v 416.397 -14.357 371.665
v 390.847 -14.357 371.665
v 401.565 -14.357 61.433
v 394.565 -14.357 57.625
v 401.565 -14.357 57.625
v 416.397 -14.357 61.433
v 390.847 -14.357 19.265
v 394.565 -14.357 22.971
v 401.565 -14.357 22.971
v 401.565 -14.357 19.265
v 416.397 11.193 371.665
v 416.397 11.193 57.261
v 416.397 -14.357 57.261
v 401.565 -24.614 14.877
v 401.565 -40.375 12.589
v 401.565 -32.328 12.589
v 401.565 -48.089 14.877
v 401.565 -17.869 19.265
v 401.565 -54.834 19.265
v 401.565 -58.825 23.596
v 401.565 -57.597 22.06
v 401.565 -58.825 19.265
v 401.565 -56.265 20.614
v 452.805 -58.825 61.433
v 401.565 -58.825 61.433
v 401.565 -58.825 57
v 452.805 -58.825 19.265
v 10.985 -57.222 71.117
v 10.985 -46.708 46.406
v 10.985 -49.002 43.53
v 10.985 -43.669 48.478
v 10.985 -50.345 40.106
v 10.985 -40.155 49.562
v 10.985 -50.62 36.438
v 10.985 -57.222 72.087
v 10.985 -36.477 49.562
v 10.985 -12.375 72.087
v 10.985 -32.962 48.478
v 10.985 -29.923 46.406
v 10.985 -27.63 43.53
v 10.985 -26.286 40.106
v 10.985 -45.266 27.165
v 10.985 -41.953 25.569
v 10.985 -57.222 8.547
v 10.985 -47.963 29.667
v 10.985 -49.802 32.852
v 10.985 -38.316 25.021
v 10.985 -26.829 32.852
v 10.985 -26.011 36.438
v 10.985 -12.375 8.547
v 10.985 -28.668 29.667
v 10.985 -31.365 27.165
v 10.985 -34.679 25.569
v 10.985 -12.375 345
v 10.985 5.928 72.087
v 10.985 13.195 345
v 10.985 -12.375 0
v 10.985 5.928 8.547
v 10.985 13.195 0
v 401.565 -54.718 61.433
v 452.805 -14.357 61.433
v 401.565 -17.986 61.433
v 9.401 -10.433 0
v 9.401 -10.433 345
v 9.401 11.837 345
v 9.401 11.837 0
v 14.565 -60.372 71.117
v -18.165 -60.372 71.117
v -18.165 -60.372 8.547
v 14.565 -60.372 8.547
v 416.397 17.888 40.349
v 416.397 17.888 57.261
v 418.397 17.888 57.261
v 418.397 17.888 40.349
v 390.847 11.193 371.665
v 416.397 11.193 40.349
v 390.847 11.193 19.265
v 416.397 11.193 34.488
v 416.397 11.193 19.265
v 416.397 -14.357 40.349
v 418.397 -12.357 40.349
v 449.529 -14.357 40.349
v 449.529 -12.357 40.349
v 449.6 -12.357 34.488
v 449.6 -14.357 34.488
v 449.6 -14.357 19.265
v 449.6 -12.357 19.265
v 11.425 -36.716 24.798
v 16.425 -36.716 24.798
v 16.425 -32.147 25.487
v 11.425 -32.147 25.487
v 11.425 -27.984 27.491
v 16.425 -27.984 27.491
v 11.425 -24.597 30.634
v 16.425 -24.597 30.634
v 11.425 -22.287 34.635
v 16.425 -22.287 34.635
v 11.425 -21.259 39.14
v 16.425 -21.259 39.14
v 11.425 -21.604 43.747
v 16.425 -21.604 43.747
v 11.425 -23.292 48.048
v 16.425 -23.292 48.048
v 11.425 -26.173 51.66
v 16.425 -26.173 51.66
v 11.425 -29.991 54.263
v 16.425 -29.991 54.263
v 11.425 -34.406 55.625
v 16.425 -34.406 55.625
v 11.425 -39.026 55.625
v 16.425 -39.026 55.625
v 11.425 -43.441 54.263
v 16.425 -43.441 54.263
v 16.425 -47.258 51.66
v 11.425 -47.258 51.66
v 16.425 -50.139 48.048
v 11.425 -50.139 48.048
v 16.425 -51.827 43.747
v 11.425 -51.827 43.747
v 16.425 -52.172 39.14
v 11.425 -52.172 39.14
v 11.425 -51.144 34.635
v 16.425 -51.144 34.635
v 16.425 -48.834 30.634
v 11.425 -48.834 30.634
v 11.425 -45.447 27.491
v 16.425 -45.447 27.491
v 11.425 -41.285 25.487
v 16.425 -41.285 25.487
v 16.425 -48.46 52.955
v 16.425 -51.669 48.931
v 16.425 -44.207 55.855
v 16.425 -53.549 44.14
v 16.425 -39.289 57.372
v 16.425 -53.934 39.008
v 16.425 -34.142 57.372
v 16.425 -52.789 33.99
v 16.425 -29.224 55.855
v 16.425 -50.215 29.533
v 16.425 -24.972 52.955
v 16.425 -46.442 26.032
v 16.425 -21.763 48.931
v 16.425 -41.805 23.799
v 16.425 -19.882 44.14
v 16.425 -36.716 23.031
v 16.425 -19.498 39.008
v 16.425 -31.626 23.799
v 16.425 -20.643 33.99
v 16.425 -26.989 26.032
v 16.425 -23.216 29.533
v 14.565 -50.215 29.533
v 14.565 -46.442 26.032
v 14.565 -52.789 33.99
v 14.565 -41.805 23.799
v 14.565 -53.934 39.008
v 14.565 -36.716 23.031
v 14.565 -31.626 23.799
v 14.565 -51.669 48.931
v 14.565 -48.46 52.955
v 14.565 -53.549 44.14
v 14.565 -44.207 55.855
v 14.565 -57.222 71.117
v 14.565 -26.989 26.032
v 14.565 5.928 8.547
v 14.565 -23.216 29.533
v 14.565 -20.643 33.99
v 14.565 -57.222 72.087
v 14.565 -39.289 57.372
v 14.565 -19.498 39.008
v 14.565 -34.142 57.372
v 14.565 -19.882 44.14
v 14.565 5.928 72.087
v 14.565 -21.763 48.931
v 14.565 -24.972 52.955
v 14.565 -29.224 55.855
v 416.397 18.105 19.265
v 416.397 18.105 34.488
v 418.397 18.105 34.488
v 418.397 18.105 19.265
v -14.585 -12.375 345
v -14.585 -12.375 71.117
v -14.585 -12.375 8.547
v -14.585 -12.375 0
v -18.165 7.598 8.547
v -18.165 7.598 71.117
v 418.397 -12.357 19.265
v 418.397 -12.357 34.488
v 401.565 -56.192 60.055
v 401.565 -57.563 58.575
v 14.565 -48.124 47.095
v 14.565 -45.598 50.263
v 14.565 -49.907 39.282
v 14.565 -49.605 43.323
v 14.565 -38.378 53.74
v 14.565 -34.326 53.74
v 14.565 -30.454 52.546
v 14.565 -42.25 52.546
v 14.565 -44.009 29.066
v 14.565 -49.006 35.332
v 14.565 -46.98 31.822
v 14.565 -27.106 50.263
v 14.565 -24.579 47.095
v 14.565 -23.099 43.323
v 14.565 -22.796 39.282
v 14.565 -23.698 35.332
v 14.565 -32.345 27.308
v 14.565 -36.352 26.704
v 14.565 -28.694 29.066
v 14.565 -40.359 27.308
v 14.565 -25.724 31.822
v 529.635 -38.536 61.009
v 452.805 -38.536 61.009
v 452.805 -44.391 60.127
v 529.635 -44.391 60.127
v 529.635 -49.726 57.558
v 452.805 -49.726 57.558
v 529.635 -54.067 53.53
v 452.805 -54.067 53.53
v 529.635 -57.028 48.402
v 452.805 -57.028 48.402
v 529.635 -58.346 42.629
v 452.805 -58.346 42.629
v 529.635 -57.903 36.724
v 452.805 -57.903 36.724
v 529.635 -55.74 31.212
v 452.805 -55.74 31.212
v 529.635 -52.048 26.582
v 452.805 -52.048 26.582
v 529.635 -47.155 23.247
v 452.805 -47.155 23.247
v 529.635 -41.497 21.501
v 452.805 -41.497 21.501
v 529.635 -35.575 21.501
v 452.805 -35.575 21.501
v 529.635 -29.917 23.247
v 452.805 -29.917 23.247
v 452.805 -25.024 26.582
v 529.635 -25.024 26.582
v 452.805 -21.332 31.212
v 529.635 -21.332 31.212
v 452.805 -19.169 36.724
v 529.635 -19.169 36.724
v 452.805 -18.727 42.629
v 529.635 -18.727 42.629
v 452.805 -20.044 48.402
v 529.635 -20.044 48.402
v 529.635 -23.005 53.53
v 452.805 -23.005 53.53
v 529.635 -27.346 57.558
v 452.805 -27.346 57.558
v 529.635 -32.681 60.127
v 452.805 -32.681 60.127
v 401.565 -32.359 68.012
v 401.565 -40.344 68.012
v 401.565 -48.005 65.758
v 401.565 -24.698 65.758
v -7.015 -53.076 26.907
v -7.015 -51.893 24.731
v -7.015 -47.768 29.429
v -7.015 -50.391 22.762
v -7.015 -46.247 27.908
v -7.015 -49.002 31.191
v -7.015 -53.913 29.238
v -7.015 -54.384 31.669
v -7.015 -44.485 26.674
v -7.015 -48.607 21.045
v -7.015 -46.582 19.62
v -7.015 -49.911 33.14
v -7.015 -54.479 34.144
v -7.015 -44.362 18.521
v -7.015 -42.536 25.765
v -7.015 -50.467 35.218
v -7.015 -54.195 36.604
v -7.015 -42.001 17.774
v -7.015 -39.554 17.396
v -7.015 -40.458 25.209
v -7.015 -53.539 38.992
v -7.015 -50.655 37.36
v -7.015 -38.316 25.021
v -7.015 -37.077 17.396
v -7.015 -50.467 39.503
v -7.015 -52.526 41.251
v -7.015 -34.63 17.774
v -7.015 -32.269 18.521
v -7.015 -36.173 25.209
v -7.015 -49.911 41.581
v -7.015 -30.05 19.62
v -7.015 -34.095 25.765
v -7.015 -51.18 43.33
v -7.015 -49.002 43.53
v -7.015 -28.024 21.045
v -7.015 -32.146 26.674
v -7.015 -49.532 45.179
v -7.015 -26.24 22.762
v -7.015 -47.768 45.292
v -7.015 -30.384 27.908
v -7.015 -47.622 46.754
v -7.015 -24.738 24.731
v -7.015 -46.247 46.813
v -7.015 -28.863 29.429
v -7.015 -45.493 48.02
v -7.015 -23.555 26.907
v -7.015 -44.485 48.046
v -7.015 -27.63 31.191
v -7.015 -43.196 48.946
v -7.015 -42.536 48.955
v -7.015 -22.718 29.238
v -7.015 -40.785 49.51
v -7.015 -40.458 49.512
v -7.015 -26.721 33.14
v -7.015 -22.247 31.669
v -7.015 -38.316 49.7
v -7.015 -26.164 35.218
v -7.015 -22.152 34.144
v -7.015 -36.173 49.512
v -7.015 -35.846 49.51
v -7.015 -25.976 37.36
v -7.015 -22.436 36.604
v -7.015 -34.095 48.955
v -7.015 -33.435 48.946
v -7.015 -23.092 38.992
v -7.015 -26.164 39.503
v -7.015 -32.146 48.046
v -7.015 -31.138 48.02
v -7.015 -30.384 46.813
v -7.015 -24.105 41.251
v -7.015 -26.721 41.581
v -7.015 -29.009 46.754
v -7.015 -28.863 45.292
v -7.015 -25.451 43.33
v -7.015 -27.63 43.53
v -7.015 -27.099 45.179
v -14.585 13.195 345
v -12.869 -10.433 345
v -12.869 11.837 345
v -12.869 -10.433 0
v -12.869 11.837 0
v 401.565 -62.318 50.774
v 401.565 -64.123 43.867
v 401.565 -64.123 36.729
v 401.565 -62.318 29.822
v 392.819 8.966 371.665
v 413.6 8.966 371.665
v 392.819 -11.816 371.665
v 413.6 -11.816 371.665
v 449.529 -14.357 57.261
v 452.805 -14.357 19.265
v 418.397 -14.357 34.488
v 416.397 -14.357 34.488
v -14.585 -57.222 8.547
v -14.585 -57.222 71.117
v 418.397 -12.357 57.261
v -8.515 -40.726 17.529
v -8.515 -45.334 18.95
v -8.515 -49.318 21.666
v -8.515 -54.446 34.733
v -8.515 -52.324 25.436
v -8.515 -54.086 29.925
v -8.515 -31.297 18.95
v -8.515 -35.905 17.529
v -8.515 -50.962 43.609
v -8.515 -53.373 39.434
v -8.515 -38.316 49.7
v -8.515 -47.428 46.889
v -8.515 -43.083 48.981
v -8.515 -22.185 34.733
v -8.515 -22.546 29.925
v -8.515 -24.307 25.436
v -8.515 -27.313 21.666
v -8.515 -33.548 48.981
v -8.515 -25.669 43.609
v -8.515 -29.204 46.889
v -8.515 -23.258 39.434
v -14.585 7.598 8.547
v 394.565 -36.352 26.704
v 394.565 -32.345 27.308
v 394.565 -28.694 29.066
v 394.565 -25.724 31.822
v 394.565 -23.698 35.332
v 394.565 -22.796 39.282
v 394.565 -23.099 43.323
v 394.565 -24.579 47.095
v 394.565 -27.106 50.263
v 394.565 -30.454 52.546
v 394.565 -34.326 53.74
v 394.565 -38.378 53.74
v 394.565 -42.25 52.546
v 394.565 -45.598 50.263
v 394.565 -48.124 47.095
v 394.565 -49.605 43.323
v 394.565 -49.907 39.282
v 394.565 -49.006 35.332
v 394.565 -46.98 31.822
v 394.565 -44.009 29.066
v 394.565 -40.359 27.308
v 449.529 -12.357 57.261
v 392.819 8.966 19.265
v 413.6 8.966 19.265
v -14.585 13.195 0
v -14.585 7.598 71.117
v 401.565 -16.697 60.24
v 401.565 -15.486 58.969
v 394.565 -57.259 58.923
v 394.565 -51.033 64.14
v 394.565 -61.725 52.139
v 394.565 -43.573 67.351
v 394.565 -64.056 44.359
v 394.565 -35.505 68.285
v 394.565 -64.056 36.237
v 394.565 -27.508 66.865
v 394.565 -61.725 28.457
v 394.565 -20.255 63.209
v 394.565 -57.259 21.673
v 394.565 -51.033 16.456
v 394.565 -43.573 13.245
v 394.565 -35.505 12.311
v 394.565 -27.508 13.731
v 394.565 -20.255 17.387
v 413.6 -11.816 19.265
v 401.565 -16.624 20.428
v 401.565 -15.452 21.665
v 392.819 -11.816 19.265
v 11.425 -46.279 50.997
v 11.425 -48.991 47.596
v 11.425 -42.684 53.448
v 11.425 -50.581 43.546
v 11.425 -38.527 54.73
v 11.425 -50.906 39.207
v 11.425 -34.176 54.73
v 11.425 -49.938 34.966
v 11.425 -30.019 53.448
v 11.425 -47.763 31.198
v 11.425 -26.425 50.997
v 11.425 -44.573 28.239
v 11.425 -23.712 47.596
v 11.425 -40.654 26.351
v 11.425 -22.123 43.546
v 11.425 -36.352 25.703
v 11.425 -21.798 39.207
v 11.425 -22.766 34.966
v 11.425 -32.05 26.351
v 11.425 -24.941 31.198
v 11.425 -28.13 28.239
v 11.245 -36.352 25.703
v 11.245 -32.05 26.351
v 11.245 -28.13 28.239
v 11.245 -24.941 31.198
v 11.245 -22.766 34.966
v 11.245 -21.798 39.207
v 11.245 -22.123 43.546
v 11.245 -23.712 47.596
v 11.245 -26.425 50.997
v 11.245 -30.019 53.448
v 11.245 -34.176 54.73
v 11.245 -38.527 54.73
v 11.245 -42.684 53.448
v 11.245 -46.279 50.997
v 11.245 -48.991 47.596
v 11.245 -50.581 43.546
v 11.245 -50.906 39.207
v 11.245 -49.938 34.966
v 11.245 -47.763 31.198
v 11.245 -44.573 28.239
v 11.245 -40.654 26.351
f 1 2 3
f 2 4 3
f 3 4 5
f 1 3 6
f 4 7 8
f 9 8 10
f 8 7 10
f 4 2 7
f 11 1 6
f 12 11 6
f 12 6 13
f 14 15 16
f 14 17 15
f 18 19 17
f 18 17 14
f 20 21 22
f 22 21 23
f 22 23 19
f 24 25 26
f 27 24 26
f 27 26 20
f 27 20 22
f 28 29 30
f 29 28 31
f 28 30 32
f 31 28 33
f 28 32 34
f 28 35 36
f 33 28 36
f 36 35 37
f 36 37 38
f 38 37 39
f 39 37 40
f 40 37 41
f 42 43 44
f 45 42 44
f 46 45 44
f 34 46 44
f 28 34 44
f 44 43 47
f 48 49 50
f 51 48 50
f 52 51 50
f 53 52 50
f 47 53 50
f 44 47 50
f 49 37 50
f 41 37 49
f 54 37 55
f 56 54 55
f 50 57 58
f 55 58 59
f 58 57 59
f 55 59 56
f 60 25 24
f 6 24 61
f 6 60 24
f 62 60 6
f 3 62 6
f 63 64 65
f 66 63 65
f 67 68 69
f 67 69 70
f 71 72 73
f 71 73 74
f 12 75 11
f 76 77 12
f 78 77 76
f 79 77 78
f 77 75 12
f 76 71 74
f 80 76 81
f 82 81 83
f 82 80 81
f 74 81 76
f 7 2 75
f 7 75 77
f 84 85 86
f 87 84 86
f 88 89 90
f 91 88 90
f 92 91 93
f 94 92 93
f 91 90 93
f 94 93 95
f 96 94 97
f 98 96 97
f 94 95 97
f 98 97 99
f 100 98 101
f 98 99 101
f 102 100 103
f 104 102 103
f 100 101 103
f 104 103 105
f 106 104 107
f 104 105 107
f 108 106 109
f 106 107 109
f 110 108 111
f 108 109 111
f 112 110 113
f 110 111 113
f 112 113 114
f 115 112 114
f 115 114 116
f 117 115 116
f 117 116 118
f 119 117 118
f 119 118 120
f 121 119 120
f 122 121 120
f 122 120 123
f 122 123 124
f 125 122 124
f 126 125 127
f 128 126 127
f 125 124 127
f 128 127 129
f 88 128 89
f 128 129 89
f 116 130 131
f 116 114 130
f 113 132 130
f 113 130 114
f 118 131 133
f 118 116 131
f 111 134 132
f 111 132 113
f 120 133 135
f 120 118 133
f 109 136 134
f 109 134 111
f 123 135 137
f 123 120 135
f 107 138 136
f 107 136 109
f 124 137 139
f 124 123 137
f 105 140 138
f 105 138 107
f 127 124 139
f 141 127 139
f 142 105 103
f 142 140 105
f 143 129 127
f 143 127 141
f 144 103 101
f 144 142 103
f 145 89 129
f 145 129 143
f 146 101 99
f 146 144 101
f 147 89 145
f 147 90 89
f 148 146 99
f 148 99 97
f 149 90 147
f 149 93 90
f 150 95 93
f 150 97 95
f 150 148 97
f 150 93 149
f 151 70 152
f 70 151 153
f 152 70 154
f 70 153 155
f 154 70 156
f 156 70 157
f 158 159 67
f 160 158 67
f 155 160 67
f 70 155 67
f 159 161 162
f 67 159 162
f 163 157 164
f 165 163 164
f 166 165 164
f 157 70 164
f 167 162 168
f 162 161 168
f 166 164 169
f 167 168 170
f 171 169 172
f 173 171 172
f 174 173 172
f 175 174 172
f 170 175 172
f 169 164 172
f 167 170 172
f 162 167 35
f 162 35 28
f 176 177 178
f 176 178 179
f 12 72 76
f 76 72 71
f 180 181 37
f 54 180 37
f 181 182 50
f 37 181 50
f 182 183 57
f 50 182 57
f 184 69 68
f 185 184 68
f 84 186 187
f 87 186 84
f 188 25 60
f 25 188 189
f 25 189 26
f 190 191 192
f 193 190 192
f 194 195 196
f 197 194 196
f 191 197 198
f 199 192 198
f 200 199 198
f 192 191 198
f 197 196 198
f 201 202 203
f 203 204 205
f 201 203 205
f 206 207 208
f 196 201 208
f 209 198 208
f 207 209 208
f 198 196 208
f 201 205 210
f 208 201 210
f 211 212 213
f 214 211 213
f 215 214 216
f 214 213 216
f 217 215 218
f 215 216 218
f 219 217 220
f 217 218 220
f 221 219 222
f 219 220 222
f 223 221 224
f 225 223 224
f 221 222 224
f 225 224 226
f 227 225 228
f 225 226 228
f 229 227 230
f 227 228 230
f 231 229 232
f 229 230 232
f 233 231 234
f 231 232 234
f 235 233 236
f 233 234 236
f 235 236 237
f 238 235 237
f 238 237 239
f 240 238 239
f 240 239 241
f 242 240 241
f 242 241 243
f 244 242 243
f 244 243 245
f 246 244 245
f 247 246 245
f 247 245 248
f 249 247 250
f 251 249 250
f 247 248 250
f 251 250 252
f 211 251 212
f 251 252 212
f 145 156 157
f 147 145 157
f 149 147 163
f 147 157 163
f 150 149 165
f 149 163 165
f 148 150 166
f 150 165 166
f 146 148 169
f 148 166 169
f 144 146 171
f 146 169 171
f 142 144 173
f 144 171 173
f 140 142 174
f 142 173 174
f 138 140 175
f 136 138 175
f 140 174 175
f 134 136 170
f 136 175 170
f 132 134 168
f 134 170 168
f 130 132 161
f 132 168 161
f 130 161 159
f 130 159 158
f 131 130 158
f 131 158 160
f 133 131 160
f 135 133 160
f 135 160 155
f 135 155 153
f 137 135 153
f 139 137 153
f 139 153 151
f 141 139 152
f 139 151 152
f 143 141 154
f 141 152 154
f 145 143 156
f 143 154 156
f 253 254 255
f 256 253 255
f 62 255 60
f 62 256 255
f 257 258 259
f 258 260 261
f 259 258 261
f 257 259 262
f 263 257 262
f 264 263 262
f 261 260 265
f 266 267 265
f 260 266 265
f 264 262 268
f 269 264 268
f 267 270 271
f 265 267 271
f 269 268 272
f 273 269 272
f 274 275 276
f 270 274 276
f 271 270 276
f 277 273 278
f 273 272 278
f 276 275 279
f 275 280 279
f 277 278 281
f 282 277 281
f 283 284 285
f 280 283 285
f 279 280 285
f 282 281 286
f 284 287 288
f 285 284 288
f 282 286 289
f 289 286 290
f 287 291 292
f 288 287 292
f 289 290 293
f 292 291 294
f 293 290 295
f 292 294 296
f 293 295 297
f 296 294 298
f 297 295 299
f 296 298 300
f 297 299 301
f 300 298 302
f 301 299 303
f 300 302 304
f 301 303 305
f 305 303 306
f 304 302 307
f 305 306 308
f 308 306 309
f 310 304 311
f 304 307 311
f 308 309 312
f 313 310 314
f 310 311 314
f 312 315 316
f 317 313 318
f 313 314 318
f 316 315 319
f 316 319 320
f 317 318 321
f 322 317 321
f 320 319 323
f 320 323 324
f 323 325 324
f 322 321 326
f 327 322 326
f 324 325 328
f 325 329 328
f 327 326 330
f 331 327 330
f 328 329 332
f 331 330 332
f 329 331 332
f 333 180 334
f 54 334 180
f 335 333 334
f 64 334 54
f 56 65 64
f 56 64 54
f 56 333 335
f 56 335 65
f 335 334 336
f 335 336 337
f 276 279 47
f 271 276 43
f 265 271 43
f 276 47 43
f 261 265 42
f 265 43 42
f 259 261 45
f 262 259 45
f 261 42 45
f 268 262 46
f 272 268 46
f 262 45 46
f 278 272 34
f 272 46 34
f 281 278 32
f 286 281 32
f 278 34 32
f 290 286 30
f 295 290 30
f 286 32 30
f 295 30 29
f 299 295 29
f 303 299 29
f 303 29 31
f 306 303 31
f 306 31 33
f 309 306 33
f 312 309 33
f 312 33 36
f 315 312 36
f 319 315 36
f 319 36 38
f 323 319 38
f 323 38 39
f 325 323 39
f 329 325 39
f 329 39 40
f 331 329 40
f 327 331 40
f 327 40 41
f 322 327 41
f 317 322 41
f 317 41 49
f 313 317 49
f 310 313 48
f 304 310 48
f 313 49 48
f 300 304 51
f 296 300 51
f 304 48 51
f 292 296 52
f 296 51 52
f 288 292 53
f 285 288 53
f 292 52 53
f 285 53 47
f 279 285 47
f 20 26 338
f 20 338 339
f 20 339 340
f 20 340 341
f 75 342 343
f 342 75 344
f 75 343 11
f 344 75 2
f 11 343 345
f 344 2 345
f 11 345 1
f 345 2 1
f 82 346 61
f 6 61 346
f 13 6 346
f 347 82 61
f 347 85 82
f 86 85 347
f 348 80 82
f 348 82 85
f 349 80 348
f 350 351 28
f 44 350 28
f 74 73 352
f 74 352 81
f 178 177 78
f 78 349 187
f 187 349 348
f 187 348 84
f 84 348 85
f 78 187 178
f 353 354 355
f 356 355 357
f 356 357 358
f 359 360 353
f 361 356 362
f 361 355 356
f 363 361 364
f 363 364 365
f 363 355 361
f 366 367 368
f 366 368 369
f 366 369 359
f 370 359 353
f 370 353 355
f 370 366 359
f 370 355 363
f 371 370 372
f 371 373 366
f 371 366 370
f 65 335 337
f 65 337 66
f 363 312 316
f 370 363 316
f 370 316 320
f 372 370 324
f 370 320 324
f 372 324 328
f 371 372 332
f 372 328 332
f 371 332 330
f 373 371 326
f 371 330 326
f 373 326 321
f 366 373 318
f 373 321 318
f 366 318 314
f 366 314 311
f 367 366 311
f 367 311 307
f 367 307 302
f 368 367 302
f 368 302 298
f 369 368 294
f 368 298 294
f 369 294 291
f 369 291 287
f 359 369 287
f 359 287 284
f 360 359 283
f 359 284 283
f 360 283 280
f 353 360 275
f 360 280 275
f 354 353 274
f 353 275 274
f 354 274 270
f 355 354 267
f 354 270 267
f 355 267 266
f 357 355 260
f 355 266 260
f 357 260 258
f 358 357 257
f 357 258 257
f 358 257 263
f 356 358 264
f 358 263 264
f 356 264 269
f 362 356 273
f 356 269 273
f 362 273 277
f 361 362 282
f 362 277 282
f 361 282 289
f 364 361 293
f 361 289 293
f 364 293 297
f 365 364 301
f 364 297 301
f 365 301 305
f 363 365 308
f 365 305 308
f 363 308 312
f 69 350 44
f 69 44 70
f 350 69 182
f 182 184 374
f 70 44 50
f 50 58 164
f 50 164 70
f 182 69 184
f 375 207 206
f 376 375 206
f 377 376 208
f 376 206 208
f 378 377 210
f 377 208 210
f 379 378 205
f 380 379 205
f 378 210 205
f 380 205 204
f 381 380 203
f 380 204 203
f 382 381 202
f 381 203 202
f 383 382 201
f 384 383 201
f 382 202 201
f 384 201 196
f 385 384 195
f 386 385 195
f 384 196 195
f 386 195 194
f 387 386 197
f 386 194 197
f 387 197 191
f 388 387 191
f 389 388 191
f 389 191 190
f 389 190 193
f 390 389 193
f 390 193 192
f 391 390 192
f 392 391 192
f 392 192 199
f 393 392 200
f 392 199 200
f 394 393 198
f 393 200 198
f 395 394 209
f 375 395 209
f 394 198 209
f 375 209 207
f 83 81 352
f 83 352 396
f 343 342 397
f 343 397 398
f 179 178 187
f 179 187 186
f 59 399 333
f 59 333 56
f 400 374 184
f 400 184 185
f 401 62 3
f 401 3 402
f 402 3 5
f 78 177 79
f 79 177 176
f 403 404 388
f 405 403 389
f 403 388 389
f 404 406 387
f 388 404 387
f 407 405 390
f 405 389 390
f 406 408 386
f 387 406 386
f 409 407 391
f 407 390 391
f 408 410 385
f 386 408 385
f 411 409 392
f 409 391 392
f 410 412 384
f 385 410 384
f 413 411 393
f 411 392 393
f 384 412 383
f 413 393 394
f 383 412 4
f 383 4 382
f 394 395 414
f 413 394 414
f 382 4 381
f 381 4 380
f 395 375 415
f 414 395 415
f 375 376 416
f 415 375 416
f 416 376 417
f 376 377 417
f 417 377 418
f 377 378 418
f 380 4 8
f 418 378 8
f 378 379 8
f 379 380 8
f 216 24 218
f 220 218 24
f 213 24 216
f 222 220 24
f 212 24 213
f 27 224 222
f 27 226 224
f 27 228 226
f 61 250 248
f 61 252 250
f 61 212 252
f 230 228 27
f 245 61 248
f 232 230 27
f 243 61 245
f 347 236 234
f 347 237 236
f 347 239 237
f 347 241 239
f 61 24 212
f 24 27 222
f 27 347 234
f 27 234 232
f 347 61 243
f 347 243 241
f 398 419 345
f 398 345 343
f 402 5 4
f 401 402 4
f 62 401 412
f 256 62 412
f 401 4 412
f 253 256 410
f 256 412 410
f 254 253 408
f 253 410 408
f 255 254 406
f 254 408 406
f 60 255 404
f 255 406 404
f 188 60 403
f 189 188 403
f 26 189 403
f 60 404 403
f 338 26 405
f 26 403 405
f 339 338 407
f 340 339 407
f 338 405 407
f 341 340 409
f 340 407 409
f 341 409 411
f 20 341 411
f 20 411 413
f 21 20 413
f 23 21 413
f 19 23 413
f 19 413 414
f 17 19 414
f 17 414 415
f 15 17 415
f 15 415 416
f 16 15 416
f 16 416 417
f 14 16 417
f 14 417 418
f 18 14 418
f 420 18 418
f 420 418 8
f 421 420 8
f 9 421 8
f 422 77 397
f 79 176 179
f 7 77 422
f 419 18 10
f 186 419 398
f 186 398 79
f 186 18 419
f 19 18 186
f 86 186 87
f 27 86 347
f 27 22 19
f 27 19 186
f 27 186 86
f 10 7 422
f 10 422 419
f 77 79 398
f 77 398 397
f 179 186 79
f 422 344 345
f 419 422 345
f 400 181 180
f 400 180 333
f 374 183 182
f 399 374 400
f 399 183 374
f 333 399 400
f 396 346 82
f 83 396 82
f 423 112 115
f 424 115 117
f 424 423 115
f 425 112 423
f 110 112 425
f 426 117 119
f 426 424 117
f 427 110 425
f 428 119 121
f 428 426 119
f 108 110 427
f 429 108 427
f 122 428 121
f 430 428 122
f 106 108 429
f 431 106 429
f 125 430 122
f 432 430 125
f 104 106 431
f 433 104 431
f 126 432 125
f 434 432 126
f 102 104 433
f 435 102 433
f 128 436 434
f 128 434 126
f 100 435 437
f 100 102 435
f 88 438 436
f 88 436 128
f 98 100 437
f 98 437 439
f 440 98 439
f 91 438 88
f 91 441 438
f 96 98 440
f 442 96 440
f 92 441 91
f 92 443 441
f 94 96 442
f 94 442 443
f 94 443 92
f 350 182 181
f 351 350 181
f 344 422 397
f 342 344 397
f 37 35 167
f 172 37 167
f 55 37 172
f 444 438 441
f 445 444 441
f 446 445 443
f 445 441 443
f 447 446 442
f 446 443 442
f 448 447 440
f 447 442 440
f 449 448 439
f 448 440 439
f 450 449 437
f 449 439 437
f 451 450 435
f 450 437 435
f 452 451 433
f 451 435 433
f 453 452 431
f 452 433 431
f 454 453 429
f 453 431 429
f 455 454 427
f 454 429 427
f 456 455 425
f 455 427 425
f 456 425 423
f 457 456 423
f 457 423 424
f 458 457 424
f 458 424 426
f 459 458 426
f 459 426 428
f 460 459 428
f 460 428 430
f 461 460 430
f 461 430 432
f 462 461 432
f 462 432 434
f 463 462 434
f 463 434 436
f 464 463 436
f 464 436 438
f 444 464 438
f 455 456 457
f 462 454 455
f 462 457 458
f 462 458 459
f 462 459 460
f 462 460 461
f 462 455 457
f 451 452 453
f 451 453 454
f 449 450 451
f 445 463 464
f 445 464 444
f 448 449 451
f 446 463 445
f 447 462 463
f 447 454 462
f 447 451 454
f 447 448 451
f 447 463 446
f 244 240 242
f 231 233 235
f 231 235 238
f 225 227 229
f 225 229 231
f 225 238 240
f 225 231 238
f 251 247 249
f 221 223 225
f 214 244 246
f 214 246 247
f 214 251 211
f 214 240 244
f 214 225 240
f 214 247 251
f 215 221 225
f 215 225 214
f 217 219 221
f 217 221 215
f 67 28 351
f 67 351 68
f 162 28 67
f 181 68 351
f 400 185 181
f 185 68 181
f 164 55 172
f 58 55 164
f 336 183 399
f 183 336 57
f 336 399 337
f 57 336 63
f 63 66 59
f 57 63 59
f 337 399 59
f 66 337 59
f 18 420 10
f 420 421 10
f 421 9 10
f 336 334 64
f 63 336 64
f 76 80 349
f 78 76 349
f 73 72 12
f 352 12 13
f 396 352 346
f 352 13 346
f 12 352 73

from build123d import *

# Parameters (mm, degrees)
SKETCH_1_W          = 25.57
SKETCH_1_H          = 25.57
EXTRUDE_1_DEPTH     = 345
SKETCH_2_W          = 22.27
SKETCH_2_H          = 22.27
CUT_EXTRUDE_1_DEPTH = 345
SKETCH_3_W          = 62.57
SKETCH_3_H          = 64.82
EXTRUDE_2_DEPTH     = 3.58
SKETCH_4_W          = 63.54
SKETCH_4_H          = 63.15
EXTRUDE_3_DEPTH     = 3.58
SKETCH_6_W          = 32.73
SKETCH_6_H          = 62.57
EXTRUDE_4_DEPTH     = 3.15
SKETCH_7_R          = 14.595
CUT_EXTRUDE_3_DEPTH = 3.32
SKETCH_8_R          = 17.266528804
EXTRUDE_5_DEPTH     = 1.86
SKETCH_9_R          = 15.5
CUT_EXTRUDE_5_DEPTH = 5
SKETCH_10_R         = 13.593774784
EXTRUDE_6_DEPTH     = 380
SKETCH_11_R         = 12.339130987
EXTRUDE_7_DEPTH     = 18
SKETCH_12_R         = 16.175538184
EXTRUDE_8_DEPTH     = 1.5
SKETCH_13_R         = 28
EXTRUDE_9_DEPTH     = 7
SKETCH_14_R         = 7.6
EXTRUDE_10_DEPTH    = 15.2
SKETCH_15_W         = 42.168470392
SKETCH_15_H         = 44.467815759
EXTRUDE_11_DEPTH    = 51.24
SKETCH_16_R         = 19.865
EXTRUDE_12_DEPTH    = 76.83
SKETCH_17_W         = 25.55
SKETCH_17_H         = 352.4
EXTRUDE_14_DEPTH    = 25.55
SKETCH_19_W         = 20.781659092
SKETCH_19_H         = 20.781659093
CUT_EXTRUDE_6_DEPTH = 358
SKETCH_20_W         = 16.912134217
SKETCH_20_H         = 32.244748354
EXTRUDE_15_DEPTH    = 2
SKETCH_21_W         = 15.223124647
SKETCH_21_H         = 32.461925803
EXTRUDE_16_DEPTH    = 2
SKETCH_22_W         = 31.1314176
SKETCH_22_H         = 16.912134217
EXTRUDE_17_DEPTH    = 2
SKETCH_23_W         = 31.20221205
SKETCH_23_H         = 15.223124647
EXTRUDE_18_DEPTH    = 2


with BuildPart() as part:
    # 草图1 → 凸台-拉伸1 (new body)
    with BuildSketch(Plane.XY):
        with Locations((-1.800204815, 0.409674702)):
            Rectangle(SKETCH_1_W, SKETCH_1_H)
    extrude(amount=EXTRUDE_1_DEPTH)

    # 草图2 → 切除-拉伸1 (cut)
    with BuildSketch(Plane.XY.offset(345)):
        with Locations((-1.734478046, 0.70158513)):
            Rectangle(SKETCH_2_W, SKETCH_2_H)
    extrude(amount=-CUT_EXTRUDE_1_DEPTH, mode=Mode.SUBTRACT)

    # 草图3 → 凸台-拉伸2 (add)
    with BuildSketch(Plane.ZY.offset(14.585204815)):
        with Locations((39.832355507, -24.812039034)):
            Rectangle(SKETCH_3_W, SKETCH_3_H)
    extrude(amount=EXTRUDE_2_DEPTH)

    # 草图4 → 凸台-拉伸3 (add)
    with BuildSketch(Plane(origin=(10.984795185, 0, 0), x_dir=(0, 0, -1), z_dir=(1, 0, 0))):
        with Locations((-40.317355507, -25.647039034)):
            Rectangle(SKETCH_4_W, SKETCH_4_H)
    extrude(amount=EXTRUDE_3_DEPTH)

    # 草图6 → 凸台-拉伸4 (add)
    with BuildSketch(Plane.XZ.offset(57.222039034)):
        with Locations((-1.800204815, 39.832355507)):
            Rectangle(SKETCH_6_W, SKETCH_6_H)
    extrude(amount=EXTRUDE_4_DEPTH)

    # 草图7 → 切除-拉伸3 (cut)
    with BuildSketch(Plane(origin=(14.564795185, 0, 0), x_dir=(0, 0, -1), z_dir=(1, 0, 0))):
        with Locations((-40.298008042, -36.351713038)):
            Circle(SKETCH_7_R)
    extrude(amount=-CUT_EXTRUDE_3_DEPTH, mode=Mode.SUBTRACT)

    # 草图8 → 凸台-拉伸5 (add)
    with BuildSketch(Plane(origin=(14.564795185, 0, 0), x_dir=(0, 0, -1), z_dir=(1, 0, 0))):
        with Locations((-40.298008042, -36.715804345)):
            Circle(SKETCH_8_R)
    extrude(amount=EXTRUDE_5_DEPTH)

    # 草图9 → 切除-拉伸5 (cut)
    with BuildSketch(Plane(origin=(16.424795185, 0, 0), x_dir=(0, 0, -1), z_dir=(1, 0, 0))):
        with Locations((-40.298008042, -36.715804345)):
            Circle(SKETCH_9_R)
    extrude(amount=-CUT_EXTRUDE_5_DEPTH, mode=Mode.SUBTRACT)

    # 草图11 → 凸台-拉伸7 (add)
    with BuildSketch(Plane.ZY.offset(-10.984795185)):
        with Locations(Location((37.360399055, -38.315560546, 0), (0, 0, 180))):
            Circle(SKETCH_11_R)
    extrude(amount=EXTRUDE_7_DEPTH)

    # 草图12 → 凸台-拉伸8 (add)
    with BuildSketch(Plane.ZY.offset(7.015204815)):
        with Locations((33.523991858, -38.315560546)):
            Circle(SKETCH_12_R)
    extrude(amount=EXTRUDE_8_DEPTH)


with BuildPart() as body_2:
    # 草图10 → 凸台-拉伸6 (new body)
    with BuildSketch(Plane(origin=(14.564795185, 0, 0), x_dir=(0, 0, -1), z_dir=(1, 0, 0))):
        with Locations((-40.298008042, -36.351713038)):
            Circle(SKETCH_10_R)
    extrude(amount=EXTRUDE_6_DEPTH)

    # 草图13 → 凸台-拉伸9 (add)
    with BuildSketch(Plane(origin=(394.564795185, 0, 0), x_dir=(0, 0, -1), z_dir=(1, 0, 0))):
        with Locations((-40.298008042, -36.351713038)):
            Circle(SKETCH_13_R)
    extrude(amount=EXTRUDE_9_DEPTH)

    # 草图14 → 凸台-拉伸10 (add)
    with BuildSketch(Plane(origin=(401.564795185, 0, 0), x_dir=(0, 0, -1), z_dir=(1, 0, 0))):
        with Locations(Location((-40.298008042, -36.351713038, 0), (0, 0, 180))):
            Circle(SKETCH_14_R)
    extrude(amount=EXTRUDE_10_DEPTH)

    # 草图15 → 凸台-拉伸11 (add)
    with BuildSketch(Plane(origin=(401.564795185, 0, 0), x_dir=(0, 0, -1), z_dir=(1, 0, 0))):
        with Locations((-40.34879958, -36.59076809)):
            Rectangle(SKETCH_15_W, SKETCH_15_H)
    extrude(amount=EXTRUDE_11_DEPTH)

    # 草图16 → 凸台-拉伸12 (add)
    with BuildSketch(Plane(origin=(452.804795185, 0, 0), x_dir=(0, 0, -1), z_dir=(1, 0, 0))):
        with Locations(Location((-41.144431097, -38.536072291, 0), (0, 0, 180))):
            Circle(SKETCH_16_R)
    extrude(amount=EXTRUDE_12_DEPTH)

    # 草图17 → 凸台-拉伸14 (add)
    with BuildSketch(Plane(origin=(0, -14.356860211, 0), x_dir=(1, 0, 0), z_dir=(0, 1, 0))):
        with Locations((403.622359348, -195.464564384)):
            Rectangle(SKETCH_17_W, SKETCH_17_H)
    extrude(amount=EXTRUDE_14_DEPTH)

    # 草图19 → 切除-拉伸6 (cut)
    with BuildSketch(Plane.XY.offset(371.664564384)):
        with Locations((403.20941807, -1.425128826)):
            Rectangle(SKETCH_19_W, SKETCH_19_H)
    extrude(amount=-CUT_EXTRUDE_6_DEPTH, mode=Mode.SUBTRACT)

    # 草图20 → 凸台-拉伸15 (add)
    with BuildSketch(Plane(origin=(416.397359348, 0, 0), x_dir=(0, 0, -1), z_dir=(1, 0, 0))):
        with Locations((-48.804866689, 1.765513966)):
            Rectangle(SKETCH_20_W, SKETCH_20_H)
    extrude(amount=EXTRUDE_15_DEPTH)

    # 草图21 → 凸台-拉伸16 (add)
    with BuildSketch(Plane(origin=(416.397359348, 0, 0), x_dir=(0, 0, -1), z_dir=(1, 0, 0))):
        with Locations((-26.876126707, 1.874102691)):
            Rectangle(SKETCH_21_W, SKETCH_21_H)
    extrude(amount=EXTRUDE_16_DEPTH)

    # 草图22 → 凸台-拉伸17 (add)
    with BuildSketch(Plane(origin=(0, -14.356860211, 0), x_dir=(1, 0, 0), z_dir=(0, 1, 0))):
        with Locations((433.963068148, -48.804866689)):
            Rectangle(SKETCH_22_W, SKETCH_22_H)
    extrude(amount=EXTRUDE_17_DEPTH)

    # 草图23 → 凸台-拉伸18 (add)
    with BuildSketch(Plane(origin=(0, -14.356860211, 0), x_dir=(1, 0, 0), z_dir=(0, 1, 0))):
        with Locations((433.998465373, -26.876126707)):
            Rectangle(SKETCH_23_W, SKETCH_23_H)
    extrude(amount=EXTRUDE_18_DEPTH)


solid = Compound([part.part, body_2.part])
